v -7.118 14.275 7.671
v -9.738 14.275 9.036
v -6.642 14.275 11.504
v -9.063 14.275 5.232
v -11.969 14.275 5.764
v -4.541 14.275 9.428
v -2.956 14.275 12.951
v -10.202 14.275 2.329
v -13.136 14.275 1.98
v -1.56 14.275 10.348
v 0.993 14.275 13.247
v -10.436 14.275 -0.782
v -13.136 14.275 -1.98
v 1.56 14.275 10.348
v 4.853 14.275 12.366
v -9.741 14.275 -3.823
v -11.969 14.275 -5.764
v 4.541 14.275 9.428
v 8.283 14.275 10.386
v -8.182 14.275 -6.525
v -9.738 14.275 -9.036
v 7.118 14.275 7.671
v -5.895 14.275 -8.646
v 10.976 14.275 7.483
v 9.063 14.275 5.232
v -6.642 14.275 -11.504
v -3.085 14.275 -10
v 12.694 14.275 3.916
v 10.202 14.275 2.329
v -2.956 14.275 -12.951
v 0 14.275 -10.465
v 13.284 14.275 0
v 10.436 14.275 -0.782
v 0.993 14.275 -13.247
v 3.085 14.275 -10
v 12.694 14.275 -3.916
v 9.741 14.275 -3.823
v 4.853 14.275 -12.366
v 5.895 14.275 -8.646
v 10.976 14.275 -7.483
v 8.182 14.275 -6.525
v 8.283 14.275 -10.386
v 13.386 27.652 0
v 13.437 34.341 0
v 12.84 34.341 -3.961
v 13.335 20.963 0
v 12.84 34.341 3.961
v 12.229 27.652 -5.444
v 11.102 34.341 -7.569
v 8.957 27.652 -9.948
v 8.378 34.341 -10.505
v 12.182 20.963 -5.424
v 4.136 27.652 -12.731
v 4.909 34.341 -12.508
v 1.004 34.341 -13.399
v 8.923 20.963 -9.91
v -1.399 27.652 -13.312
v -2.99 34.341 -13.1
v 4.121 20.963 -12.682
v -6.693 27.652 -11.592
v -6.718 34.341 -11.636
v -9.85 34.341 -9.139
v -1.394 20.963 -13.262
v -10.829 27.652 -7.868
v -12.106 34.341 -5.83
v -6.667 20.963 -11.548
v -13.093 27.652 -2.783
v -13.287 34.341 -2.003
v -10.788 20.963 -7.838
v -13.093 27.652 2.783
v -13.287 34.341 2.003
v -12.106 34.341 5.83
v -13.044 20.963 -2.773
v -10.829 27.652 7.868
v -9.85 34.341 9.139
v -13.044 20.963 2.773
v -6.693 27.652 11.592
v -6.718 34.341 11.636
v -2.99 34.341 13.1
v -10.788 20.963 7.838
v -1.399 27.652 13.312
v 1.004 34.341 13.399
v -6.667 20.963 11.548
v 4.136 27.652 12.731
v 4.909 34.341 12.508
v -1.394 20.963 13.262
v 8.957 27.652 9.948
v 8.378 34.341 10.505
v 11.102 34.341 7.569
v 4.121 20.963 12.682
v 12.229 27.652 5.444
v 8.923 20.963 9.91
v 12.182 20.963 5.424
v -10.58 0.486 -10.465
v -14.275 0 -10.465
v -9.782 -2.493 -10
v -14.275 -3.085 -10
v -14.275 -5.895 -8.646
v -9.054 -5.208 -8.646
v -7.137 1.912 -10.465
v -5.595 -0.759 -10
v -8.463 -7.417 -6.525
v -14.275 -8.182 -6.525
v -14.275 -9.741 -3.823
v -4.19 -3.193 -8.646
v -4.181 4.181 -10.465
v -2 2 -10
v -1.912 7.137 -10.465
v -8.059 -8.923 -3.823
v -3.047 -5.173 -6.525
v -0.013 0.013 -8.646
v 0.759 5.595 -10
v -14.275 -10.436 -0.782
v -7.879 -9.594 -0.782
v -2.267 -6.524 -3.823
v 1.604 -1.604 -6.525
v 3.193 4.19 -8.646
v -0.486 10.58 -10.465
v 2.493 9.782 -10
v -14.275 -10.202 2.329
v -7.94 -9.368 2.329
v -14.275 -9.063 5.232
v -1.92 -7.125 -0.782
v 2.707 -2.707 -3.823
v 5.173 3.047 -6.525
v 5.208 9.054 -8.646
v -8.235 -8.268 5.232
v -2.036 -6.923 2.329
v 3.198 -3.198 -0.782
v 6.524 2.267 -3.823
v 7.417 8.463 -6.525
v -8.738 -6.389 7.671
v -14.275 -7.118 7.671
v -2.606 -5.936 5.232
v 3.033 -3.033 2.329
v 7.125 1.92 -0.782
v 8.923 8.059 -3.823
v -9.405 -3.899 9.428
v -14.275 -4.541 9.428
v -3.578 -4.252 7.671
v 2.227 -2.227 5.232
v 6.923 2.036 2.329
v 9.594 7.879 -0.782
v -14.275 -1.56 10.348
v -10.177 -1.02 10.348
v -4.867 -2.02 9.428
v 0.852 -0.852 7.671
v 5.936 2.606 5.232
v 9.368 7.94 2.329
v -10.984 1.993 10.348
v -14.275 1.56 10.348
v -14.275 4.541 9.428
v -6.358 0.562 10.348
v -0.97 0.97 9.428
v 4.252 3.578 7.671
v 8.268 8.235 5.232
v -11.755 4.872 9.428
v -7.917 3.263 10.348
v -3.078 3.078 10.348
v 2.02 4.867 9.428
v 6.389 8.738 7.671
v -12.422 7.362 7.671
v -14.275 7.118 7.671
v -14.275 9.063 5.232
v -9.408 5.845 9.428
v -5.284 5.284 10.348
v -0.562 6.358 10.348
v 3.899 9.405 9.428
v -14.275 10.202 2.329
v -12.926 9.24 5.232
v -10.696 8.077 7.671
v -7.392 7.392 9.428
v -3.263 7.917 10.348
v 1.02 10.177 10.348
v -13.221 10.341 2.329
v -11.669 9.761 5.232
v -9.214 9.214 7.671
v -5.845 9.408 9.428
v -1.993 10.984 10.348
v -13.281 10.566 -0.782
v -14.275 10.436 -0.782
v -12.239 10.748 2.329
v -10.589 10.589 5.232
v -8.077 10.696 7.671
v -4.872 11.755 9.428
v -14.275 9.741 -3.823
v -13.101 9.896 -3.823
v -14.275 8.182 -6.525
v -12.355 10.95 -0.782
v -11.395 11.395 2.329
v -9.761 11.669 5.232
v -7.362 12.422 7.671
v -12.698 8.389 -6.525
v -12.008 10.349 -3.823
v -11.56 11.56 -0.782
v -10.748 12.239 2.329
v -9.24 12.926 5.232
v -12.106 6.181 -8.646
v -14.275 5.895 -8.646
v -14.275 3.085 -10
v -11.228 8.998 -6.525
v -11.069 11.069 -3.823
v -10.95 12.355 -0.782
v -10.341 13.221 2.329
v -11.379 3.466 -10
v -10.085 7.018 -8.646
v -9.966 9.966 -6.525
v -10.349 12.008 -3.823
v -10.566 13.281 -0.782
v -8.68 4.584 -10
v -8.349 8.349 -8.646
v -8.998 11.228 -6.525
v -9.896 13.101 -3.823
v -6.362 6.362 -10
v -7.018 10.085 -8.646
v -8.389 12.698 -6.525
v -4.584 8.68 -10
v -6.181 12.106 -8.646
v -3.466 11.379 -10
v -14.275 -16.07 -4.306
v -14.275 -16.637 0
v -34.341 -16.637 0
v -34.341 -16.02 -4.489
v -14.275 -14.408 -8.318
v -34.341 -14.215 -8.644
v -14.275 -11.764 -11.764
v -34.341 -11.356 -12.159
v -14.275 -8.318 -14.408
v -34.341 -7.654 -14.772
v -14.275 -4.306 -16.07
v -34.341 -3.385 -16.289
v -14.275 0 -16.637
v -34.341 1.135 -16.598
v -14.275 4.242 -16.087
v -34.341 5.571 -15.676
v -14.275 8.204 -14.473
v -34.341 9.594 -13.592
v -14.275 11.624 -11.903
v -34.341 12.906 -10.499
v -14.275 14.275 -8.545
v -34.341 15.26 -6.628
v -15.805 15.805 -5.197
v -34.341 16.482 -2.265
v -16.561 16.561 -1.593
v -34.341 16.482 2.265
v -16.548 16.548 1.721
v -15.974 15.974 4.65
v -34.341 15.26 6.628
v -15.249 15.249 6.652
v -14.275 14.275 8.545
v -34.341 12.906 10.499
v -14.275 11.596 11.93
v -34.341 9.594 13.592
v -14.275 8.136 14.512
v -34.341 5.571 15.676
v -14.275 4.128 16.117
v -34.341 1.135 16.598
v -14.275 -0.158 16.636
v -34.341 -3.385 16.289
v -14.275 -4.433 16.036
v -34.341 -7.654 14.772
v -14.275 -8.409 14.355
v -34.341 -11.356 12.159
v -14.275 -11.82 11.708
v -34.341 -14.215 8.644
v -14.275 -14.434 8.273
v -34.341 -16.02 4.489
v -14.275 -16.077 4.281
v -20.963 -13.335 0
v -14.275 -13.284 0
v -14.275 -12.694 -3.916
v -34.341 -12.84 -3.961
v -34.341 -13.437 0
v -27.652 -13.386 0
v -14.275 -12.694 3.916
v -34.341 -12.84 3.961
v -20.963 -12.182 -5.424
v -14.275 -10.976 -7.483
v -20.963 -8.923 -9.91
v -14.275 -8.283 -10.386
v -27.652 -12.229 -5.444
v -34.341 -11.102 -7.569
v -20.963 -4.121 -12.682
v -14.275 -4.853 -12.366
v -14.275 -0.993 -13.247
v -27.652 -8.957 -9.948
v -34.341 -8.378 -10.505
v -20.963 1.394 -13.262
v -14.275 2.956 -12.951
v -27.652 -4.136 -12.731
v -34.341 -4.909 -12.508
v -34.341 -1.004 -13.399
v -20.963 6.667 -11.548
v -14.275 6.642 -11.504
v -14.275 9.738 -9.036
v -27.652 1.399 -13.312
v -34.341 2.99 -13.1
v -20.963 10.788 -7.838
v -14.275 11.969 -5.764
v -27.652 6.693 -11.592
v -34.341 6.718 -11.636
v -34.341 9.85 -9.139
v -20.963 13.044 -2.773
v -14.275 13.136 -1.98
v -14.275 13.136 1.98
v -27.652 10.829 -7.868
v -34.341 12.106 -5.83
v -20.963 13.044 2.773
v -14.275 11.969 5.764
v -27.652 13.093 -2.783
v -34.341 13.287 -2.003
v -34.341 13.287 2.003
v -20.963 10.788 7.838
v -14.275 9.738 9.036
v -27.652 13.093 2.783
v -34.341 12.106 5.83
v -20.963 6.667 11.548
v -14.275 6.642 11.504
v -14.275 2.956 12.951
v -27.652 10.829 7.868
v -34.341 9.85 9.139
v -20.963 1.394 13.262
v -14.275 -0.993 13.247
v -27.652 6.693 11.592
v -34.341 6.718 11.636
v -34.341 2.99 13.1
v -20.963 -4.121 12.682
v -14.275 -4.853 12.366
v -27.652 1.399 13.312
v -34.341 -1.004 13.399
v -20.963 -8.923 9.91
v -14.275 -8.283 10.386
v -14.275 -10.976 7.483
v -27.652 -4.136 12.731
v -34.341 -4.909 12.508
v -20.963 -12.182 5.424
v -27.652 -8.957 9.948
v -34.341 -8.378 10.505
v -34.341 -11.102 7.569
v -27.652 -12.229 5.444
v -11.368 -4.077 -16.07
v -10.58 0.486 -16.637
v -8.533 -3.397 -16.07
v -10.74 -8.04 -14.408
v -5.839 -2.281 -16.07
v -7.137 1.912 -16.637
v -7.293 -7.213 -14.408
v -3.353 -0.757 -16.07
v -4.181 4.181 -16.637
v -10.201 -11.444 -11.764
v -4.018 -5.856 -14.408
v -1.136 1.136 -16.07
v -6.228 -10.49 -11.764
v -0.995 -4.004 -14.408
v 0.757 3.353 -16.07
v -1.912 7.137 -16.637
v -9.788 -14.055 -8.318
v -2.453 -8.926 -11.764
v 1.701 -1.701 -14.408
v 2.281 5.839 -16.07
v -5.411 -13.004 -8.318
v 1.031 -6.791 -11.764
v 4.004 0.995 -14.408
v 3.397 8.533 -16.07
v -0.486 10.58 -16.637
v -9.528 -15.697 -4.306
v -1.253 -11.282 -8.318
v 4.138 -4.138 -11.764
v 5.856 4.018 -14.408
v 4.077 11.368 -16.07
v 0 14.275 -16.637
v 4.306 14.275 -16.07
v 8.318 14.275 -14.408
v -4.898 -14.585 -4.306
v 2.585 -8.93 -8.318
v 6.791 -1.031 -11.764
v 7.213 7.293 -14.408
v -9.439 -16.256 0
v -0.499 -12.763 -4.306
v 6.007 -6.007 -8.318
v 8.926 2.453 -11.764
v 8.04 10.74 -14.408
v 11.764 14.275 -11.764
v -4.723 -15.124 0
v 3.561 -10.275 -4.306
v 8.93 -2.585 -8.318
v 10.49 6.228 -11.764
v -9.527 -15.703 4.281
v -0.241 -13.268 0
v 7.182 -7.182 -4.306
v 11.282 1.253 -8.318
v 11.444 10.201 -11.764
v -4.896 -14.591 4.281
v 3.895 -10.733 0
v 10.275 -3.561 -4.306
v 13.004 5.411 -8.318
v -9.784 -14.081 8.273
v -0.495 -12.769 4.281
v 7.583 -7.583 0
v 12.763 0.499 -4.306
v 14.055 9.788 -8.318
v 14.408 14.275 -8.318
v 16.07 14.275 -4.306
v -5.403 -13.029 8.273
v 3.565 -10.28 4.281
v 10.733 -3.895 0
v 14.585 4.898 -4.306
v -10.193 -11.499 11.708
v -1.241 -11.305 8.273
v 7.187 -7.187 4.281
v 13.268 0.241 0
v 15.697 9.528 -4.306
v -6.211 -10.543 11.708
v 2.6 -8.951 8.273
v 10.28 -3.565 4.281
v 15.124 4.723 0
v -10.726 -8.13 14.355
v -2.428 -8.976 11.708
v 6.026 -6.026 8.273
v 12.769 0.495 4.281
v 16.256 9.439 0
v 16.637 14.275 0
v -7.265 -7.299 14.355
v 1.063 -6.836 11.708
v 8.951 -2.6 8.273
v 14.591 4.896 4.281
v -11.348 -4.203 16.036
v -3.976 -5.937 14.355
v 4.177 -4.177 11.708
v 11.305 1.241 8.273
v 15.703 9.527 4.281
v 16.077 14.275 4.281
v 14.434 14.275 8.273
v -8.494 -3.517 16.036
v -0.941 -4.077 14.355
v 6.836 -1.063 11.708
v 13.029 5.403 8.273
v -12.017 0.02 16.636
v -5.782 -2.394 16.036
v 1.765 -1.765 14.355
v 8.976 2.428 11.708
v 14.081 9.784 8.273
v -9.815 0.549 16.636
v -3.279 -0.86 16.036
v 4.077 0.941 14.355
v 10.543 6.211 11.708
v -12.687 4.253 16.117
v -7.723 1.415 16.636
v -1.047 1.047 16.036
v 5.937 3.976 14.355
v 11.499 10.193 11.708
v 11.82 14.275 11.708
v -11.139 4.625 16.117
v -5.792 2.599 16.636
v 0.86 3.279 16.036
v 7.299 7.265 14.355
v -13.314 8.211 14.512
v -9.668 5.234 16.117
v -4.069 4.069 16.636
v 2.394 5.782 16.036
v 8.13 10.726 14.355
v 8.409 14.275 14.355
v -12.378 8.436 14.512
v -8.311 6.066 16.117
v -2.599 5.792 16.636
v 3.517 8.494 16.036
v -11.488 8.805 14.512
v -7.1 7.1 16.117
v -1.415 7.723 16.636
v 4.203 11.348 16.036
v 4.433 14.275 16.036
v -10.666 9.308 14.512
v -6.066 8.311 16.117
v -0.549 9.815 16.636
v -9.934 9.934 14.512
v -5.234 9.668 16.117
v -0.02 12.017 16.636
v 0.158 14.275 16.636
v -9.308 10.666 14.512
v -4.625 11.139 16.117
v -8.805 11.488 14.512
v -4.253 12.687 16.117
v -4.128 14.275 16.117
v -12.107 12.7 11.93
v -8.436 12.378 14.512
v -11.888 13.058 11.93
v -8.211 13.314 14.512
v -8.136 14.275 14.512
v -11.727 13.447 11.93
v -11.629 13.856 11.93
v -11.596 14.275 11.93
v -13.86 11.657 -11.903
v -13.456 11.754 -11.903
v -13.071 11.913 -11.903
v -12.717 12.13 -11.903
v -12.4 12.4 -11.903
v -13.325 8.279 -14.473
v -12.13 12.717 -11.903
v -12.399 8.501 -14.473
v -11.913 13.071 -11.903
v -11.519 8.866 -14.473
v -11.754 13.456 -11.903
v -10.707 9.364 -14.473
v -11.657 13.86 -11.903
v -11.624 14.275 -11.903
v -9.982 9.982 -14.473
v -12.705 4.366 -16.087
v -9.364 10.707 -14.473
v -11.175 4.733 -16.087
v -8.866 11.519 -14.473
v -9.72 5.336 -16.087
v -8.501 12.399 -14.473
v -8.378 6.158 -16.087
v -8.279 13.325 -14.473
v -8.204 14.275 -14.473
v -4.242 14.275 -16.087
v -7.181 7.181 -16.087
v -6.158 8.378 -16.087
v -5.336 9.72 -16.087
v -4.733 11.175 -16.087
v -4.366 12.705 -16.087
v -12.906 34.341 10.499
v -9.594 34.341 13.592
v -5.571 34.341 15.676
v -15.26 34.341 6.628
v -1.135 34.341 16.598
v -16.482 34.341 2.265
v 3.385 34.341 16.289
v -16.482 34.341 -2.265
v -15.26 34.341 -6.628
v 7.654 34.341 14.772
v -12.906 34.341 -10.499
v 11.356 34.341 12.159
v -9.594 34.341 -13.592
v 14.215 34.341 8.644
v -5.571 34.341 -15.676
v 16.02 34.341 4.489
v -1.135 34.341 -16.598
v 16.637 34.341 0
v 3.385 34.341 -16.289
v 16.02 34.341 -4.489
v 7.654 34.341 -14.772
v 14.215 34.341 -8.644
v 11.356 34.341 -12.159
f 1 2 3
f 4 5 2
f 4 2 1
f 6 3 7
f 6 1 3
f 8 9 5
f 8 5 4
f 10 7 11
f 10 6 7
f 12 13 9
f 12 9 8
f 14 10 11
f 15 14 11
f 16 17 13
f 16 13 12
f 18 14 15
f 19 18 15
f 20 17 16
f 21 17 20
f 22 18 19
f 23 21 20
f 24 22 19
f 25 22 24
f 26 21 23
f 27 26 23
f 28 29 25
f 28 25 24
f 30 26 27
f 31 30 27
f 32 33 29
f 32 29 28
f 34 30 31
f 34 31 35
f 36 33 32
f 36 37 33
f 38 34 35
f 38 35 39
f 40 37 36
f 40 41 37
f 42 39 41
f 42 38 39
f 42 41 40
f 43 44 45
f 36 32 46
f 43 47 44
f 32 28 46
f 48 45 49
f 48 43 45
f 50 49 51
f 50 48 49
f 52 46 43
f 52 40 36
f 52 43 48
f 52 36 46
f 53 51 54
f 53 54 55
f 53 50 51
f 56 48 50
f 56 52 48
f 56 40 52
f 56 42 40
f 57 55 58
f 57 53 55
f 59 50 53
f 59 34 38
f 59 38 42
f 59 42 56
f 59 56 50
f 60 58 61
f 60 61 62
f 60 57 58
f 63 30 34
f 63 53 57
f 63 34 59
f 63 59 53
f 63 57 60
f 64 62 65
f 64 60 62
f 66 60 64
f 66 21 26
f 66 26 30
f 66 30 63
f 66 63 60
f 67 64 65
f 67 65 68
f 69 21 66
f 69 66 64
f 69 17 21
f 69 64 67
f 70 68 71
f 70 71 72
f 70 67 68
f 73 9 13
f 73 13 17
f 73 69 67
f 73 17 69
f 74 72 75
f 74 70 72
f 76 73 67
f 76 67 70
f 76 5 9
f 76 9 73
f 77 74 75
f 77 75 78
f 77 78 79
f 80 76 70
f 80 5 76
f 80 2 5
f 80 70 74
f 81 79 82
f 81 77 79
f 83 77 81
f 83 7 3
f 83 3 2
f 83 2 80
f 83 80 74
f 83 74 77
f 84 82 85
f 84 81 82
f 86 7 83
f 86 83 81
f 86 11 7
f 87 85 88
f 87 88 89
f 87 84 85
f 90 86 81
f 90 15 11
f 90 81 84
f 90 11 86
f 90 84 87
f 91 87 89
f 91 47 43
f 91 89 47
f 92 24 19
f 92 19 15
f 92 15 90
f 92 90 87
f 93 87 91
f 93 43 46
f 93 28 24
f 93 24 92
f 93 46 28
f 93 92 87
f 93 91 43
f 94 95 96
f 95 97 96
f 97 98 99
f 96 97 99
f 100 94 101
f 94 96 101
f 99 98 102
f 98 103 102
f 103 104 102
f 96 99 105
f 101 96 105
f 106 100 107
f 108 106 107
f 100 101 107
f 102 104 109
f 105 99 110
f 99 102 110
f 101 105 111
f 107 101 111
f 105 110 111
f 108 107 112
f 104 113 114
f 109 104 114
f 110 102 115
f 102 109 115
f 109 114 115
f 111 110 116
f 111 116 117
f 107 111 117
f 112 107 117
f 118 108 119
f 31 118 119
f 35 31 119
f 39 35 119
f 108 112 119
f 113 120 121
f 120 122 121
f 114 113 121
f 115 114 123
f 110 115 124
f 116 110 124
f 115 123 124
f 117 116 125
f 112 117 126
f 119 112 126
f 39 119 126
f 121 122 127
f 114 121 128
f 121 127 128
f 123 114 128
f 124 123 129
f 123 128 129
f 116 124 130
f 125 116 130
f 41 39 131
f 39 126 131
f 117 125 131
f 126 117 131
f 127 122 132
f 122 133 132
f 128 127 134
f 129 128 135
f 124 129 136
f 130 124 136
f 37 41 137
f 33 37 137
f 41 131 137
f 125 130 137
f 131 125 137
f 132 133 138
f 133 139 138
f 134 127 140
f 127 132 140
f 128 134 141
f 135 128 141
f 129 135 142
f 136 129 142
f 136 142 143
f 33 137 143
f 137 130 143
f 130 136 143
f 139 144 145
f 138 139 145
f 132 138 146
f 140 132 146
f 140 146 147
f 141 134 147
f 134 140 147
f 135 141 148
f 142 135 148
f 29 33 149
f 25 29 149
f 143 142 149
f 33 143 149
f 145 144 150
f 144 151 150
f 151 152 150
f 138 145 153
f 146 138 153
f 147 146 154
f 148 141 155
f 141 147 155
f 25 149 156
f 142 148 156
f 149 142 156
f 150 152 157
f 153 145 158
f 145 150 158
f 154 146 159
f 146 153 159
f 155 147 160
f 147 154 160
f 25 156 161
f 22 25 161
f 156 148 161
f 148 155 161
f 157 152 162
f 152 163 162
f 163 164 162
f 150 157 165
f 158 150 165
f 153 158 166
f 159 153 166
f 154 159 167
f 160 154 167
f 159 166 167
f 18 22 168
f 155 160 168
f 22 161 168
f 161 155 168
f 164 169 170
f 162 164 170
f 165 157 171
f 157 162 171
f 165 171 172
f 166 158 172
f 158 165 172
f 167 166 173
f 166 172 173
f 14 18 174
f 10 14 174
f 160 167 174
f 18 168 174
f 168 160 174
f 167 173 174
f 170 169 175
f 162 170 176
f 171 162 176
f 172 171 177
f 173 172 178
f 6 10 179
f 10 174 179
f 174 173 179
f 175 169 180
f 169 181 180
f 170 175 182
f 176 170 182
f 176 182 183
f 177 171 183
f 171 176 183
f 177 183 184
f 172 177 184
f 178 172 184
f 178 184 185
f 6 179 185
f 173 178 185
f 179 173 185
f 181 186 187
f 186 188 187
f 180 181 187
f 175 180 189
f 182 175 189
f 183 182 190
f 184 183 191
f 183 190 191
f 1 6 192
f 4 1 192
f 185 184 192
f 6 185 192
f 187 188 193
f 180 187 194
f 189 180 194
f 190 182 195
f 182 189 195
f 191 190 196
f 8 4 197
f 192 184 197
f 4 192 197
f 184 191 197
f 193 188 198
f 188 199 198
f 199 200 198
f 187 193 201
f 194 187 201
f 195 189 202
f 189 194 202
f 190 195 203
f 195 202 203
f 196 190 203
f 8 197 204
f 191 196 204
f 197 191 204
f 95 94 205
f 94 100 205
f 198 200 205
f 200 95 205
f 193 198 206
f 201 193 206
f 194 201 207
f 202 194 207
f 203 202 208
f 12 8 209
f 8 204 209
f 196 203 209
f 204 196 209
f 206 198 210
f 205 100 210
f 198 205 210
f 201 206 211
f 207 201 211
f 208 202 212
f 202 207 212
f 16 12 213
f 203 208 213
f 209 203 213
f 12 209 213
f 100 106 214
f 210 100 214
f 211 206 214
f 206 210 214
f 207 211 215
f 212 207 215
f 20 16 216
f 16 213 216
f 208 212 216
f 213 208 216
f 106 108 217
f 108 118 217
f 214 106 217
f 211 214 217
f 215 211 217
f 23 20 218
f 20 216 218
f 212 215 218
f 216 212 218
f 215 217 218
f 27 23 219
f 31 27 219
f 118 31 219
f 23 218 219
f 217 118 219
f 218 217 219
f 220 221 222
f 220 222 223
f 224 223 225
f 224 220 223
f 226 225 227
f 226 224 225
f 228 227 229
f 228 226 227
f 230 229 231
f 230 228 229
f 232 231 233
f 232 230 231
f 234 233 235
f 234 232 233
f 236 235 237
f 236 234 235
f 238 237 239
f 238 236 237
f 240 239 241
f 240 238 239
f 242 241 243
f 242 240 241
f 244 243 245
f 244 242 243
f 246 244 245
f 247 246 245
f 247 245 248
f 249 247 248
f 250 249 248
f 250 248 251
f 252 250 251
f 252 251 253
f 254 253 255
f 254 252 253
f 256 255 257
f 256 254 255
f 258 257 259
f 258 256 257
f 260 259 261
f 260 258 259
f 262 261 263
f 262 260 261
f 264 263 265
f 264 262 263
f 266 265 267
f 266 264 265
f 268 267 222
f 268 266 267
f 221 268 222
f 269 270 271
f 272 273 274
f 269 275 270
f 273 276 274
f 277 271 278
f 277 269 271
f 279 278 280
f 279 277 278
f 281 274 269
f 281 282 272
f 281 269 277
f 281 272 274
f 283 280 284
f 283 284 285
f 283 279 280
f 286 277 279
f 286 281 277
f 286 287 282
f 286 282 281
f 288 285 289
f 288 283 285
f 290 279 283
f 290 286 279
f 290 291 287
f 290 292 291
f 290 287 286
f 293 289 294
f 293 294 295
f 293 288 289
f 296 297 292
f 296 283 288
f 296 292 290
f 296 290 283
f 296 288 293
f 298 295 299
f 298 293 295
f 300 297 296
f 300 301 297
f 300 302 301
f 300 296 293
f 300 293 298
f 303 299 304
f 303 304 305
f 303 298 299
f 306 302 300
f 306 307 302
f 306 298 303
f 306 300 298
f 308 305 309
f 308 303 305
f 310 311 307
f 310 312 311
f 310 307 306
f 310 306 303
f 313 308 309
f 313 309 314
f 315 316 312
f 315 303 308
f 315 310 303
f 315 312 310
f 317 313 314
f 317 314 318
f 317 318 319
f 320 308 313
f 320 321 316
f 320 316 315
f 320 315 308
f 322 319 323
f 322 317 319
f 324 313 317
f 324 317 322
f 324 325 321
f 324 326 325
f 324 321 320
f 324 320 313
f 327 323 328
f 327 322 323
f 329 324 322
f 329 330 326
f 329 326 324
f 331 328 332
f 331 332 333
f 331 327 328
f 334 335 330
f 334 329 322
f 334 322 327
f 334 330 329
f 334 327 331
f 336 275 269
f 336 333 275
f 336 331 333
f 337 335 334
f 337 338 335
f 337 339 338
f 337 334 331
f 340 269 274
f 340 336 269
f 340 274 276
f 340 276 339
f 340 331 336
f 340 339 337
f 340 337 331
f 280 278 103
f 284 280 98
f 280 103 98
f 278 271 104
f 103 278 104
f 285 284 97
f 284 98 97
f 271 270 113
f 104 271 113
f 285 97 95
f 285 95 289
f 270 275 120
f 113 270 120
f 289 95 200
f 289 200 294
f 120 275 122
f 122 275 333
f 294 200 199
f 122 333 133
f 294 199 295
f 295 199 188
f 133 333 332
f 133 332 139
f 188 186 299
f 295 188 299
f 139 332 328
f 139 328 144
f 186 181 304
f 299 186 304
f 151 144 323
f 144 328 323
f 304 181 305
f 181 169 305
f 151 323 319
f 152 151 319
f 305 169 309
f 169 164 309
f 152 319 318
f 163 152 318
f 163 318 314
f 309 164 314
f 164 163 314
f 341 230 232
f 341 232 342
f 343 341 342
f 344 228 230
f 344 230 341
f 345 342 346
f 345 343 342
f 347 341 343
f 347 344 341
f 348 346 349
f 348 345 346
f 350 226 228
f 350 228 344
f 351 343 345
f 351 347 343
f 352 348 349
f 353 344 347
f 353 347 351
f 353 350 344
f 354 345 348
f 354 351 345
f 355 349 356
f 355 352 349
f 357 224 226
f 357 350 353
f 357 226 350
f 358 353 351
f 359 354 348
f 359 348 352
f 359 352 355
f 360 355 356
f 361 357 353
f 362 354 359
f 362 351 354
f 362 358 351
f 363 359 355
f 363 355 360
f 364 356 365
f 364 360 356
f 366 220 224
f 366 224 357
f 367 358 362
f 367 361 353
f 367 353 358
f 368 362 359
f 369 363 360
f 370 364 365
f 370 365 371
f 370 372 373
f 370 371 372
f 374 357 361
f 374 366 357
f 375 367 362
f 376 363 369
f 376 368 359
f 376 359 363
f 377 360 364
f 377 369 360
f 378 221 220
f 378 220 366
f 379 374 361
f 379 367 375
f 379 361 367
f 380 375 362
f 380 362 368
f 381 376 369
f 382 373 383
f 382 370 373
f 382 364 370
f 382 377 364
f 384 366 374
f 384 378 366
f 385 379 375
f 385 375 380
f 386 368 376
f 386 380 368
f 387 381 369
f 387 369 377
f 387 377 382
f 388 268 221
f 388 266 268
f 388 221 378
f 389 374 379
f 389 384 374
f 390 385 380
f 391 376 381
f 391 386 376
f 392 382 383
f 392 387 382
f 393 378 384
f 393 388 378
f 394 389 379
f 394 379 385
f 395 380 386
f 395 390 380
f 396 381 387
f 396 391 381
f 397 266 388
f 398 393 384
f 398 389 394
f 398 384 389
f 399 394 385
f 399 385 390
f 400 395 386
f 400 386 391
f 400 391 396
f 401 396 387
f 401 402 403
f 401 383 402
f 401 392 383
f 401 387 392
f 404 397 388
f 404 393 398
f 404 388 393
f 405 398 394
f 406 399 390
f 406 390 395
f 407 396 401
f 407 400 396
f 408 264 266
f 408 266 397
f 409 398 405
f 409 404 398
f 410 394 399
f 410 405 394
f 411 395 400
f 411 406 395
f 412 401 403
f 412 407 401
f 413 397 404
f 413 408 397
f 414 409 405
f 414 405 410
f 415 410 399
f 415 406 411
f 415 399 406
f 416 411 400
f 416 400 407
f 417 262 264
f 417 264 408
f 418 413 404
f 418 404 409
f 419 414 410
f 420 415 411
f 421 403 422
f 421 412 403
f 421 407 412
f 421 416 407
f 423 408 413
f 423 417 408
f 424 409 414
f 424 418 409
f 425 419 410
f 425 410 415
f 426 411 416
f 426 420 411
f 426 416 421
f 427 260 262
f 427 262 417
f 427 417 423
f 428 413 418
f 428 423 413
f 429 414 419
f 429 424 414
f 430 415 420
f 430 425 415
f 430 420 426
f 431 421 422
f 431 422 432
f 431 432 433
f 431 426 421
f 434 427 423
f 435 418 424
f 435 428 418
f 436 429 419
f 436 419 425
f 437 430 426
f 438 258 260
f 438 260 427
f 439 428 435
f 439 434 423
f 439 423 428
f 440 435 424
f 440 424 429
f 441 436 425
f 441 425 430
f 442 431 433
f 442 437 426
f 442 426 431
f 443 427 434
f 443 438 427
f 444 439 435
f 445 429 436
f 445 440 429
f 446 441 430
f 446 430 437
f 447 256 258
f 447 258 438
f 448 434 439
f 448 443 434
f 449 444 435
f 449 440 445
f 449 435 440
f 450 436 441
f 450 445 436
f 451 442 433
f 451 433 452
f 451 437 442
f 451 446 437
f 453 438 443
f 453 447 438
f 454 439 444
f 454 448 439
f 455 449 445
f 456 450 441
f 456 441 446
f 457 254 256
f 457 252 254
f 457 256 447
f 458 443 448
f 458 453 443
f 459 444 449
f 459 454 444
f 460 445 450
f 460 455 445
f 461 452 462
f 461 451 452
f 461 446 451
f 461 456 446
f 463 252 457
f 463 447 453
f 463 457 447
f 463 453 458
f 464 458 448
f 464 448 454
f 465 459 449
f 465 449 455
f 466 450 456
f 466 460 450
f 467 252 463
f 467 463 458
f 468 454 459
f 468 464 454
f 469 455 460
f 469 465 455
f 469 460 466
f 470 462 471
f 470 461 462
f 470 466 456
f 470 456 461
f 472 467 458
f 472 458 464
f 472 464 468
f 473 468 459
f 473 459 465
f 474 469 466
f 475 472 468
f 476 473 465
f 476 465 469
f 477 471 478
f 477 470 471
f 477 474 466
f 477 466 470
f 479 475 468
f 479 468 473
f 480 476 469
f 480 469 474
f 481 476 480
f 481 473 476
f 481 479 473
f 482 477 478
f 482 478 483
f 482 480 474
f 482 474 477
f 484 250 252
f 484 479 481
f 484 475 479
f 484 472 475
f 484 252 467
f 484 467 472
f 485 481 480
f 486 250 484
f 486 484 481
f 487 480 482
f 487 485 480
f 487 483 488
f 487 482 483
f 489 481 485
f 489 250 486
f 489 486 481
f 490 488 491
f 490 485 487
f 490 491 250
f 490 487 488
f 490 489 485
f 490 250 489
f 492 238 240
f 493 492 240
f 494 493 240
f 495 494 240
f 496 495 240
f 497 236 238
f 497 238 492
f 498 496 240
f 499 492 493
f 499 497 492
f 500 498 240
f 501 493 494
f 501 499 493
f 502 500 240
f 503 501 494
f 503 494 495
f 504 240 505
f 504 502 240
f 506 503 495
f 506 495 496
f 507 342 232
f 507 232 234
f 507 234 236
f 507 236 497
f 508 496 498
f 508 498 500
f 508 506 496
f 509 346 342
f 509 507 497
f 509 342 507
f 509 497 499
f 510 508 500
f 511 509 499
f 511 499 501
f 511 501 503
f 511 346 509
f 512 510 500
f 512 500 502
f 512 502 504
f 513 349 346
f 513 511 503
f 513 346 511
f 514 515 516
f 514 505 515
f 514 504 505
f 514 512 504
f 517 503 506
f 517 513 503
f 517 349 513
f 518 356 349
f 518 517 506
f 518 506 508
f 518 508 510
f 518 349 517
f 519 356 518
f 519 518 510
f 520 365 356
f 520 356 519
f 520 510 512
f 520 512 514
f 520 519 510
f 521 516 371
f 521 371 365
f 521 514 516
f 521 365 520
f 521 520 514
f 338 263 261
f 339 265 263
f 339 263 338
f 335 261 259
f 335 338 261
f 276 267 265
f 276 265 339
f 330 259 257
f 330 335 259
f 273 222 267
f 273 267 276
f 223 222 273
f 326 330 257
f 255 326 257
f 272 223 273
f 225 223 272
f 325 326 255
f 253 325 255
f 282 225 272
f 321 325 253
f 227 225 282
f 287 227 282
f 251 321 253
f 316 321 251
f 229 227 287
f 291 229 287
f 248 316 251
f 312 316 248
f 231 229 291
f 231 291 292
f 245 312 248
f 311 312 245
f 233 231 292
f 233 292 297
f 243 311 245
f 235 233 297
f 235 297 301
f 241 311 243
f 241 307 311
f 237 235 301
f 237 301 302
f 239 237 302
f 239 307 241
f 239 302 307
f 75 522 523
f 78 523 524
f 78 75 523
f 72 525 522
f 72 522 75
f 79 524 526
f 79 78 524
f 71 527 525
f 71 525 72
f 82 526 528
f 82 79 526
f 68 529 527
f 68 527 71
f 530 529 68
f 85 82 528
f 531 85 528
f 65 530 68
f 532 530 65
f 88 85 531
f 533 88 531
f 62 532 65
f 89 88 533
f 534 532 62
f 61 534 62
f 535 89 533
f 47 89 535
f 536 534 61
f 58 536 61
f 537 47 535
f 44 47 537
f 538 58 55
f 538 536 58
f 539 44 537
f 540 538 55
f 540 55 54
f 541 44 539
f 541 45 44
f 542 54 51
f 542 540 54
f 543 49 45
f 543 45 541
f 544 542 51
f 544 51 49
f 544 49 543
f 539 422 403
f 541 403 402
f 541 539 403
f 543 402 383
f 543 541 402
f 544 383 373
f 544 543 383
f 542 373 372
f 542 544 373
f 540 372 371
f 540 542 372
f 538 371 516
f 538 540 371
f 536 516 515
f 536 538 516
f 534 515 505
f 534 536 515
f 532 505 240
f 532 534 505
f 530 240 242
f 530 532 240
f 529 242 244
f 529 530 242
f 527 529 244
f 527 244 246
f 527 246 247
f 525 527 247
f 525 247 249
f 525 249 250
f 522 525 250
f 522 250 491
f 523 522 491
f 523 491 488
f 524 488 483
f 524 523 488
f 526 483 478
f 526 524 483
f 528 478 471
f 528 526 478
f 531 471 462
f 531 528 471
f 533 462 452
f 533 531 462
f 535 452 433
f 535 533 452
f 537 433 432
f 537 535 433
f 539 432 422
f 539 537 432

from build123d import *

# Parameters (mm, degrees)
SKETCH3_R   = 16.637
SKETCH3_R_2 = 10.4648


with BuildPart() as part:
    # Sketch1 → Revolve1 (revolve)
    with BuildSketch(Plane.XY):
        Polygon((-34.3408, -16.637), (-14.2748, -16.637), (-14.2748, -13.2842), (-34.3408, -13.4366), align=None)
    revolve(axis=Axis((-34.3408, 0, 0), (1, 0, 0)))



with BuildPart() as body_2:
    # Sketch2 → Revolve2 (revolve)
    with BuildSketch(Plane.XY):
        Polygon((13.4366, 34.3408), (13.2842, 14.2748), (16.637, 14.2748), (16.637, 34.3408), align=None)
    revolve(axis=Axis((0, 0, 0), (0, 1, 0)))


with BuildPart() as part_1:
    add(part.part)

    add(body_2.part)  # Sweep1 merges body 2
    # Sweep1: sweep along a path in Sketch4
    with BuildLine(Plane.XY) as sweep1_path:
        ThreePointArc((-14.2748, 0), (-4.180992, 4.180992), (0, 14.2748))
    # Sketch3 → Sweep1 (sweep)
    with BuildSketch(Plane(origin=(-14.2748, 0, 0), x_dir=(0, 0, -1), z_dir=(1, 0, 0))):
        Circle(SKETCH3_R)
        Circle(SKETCH3_R_2, mode=Mode.SUBTRACT)
    sweep(path=sweep1_path.line)


solid = part_1.part
